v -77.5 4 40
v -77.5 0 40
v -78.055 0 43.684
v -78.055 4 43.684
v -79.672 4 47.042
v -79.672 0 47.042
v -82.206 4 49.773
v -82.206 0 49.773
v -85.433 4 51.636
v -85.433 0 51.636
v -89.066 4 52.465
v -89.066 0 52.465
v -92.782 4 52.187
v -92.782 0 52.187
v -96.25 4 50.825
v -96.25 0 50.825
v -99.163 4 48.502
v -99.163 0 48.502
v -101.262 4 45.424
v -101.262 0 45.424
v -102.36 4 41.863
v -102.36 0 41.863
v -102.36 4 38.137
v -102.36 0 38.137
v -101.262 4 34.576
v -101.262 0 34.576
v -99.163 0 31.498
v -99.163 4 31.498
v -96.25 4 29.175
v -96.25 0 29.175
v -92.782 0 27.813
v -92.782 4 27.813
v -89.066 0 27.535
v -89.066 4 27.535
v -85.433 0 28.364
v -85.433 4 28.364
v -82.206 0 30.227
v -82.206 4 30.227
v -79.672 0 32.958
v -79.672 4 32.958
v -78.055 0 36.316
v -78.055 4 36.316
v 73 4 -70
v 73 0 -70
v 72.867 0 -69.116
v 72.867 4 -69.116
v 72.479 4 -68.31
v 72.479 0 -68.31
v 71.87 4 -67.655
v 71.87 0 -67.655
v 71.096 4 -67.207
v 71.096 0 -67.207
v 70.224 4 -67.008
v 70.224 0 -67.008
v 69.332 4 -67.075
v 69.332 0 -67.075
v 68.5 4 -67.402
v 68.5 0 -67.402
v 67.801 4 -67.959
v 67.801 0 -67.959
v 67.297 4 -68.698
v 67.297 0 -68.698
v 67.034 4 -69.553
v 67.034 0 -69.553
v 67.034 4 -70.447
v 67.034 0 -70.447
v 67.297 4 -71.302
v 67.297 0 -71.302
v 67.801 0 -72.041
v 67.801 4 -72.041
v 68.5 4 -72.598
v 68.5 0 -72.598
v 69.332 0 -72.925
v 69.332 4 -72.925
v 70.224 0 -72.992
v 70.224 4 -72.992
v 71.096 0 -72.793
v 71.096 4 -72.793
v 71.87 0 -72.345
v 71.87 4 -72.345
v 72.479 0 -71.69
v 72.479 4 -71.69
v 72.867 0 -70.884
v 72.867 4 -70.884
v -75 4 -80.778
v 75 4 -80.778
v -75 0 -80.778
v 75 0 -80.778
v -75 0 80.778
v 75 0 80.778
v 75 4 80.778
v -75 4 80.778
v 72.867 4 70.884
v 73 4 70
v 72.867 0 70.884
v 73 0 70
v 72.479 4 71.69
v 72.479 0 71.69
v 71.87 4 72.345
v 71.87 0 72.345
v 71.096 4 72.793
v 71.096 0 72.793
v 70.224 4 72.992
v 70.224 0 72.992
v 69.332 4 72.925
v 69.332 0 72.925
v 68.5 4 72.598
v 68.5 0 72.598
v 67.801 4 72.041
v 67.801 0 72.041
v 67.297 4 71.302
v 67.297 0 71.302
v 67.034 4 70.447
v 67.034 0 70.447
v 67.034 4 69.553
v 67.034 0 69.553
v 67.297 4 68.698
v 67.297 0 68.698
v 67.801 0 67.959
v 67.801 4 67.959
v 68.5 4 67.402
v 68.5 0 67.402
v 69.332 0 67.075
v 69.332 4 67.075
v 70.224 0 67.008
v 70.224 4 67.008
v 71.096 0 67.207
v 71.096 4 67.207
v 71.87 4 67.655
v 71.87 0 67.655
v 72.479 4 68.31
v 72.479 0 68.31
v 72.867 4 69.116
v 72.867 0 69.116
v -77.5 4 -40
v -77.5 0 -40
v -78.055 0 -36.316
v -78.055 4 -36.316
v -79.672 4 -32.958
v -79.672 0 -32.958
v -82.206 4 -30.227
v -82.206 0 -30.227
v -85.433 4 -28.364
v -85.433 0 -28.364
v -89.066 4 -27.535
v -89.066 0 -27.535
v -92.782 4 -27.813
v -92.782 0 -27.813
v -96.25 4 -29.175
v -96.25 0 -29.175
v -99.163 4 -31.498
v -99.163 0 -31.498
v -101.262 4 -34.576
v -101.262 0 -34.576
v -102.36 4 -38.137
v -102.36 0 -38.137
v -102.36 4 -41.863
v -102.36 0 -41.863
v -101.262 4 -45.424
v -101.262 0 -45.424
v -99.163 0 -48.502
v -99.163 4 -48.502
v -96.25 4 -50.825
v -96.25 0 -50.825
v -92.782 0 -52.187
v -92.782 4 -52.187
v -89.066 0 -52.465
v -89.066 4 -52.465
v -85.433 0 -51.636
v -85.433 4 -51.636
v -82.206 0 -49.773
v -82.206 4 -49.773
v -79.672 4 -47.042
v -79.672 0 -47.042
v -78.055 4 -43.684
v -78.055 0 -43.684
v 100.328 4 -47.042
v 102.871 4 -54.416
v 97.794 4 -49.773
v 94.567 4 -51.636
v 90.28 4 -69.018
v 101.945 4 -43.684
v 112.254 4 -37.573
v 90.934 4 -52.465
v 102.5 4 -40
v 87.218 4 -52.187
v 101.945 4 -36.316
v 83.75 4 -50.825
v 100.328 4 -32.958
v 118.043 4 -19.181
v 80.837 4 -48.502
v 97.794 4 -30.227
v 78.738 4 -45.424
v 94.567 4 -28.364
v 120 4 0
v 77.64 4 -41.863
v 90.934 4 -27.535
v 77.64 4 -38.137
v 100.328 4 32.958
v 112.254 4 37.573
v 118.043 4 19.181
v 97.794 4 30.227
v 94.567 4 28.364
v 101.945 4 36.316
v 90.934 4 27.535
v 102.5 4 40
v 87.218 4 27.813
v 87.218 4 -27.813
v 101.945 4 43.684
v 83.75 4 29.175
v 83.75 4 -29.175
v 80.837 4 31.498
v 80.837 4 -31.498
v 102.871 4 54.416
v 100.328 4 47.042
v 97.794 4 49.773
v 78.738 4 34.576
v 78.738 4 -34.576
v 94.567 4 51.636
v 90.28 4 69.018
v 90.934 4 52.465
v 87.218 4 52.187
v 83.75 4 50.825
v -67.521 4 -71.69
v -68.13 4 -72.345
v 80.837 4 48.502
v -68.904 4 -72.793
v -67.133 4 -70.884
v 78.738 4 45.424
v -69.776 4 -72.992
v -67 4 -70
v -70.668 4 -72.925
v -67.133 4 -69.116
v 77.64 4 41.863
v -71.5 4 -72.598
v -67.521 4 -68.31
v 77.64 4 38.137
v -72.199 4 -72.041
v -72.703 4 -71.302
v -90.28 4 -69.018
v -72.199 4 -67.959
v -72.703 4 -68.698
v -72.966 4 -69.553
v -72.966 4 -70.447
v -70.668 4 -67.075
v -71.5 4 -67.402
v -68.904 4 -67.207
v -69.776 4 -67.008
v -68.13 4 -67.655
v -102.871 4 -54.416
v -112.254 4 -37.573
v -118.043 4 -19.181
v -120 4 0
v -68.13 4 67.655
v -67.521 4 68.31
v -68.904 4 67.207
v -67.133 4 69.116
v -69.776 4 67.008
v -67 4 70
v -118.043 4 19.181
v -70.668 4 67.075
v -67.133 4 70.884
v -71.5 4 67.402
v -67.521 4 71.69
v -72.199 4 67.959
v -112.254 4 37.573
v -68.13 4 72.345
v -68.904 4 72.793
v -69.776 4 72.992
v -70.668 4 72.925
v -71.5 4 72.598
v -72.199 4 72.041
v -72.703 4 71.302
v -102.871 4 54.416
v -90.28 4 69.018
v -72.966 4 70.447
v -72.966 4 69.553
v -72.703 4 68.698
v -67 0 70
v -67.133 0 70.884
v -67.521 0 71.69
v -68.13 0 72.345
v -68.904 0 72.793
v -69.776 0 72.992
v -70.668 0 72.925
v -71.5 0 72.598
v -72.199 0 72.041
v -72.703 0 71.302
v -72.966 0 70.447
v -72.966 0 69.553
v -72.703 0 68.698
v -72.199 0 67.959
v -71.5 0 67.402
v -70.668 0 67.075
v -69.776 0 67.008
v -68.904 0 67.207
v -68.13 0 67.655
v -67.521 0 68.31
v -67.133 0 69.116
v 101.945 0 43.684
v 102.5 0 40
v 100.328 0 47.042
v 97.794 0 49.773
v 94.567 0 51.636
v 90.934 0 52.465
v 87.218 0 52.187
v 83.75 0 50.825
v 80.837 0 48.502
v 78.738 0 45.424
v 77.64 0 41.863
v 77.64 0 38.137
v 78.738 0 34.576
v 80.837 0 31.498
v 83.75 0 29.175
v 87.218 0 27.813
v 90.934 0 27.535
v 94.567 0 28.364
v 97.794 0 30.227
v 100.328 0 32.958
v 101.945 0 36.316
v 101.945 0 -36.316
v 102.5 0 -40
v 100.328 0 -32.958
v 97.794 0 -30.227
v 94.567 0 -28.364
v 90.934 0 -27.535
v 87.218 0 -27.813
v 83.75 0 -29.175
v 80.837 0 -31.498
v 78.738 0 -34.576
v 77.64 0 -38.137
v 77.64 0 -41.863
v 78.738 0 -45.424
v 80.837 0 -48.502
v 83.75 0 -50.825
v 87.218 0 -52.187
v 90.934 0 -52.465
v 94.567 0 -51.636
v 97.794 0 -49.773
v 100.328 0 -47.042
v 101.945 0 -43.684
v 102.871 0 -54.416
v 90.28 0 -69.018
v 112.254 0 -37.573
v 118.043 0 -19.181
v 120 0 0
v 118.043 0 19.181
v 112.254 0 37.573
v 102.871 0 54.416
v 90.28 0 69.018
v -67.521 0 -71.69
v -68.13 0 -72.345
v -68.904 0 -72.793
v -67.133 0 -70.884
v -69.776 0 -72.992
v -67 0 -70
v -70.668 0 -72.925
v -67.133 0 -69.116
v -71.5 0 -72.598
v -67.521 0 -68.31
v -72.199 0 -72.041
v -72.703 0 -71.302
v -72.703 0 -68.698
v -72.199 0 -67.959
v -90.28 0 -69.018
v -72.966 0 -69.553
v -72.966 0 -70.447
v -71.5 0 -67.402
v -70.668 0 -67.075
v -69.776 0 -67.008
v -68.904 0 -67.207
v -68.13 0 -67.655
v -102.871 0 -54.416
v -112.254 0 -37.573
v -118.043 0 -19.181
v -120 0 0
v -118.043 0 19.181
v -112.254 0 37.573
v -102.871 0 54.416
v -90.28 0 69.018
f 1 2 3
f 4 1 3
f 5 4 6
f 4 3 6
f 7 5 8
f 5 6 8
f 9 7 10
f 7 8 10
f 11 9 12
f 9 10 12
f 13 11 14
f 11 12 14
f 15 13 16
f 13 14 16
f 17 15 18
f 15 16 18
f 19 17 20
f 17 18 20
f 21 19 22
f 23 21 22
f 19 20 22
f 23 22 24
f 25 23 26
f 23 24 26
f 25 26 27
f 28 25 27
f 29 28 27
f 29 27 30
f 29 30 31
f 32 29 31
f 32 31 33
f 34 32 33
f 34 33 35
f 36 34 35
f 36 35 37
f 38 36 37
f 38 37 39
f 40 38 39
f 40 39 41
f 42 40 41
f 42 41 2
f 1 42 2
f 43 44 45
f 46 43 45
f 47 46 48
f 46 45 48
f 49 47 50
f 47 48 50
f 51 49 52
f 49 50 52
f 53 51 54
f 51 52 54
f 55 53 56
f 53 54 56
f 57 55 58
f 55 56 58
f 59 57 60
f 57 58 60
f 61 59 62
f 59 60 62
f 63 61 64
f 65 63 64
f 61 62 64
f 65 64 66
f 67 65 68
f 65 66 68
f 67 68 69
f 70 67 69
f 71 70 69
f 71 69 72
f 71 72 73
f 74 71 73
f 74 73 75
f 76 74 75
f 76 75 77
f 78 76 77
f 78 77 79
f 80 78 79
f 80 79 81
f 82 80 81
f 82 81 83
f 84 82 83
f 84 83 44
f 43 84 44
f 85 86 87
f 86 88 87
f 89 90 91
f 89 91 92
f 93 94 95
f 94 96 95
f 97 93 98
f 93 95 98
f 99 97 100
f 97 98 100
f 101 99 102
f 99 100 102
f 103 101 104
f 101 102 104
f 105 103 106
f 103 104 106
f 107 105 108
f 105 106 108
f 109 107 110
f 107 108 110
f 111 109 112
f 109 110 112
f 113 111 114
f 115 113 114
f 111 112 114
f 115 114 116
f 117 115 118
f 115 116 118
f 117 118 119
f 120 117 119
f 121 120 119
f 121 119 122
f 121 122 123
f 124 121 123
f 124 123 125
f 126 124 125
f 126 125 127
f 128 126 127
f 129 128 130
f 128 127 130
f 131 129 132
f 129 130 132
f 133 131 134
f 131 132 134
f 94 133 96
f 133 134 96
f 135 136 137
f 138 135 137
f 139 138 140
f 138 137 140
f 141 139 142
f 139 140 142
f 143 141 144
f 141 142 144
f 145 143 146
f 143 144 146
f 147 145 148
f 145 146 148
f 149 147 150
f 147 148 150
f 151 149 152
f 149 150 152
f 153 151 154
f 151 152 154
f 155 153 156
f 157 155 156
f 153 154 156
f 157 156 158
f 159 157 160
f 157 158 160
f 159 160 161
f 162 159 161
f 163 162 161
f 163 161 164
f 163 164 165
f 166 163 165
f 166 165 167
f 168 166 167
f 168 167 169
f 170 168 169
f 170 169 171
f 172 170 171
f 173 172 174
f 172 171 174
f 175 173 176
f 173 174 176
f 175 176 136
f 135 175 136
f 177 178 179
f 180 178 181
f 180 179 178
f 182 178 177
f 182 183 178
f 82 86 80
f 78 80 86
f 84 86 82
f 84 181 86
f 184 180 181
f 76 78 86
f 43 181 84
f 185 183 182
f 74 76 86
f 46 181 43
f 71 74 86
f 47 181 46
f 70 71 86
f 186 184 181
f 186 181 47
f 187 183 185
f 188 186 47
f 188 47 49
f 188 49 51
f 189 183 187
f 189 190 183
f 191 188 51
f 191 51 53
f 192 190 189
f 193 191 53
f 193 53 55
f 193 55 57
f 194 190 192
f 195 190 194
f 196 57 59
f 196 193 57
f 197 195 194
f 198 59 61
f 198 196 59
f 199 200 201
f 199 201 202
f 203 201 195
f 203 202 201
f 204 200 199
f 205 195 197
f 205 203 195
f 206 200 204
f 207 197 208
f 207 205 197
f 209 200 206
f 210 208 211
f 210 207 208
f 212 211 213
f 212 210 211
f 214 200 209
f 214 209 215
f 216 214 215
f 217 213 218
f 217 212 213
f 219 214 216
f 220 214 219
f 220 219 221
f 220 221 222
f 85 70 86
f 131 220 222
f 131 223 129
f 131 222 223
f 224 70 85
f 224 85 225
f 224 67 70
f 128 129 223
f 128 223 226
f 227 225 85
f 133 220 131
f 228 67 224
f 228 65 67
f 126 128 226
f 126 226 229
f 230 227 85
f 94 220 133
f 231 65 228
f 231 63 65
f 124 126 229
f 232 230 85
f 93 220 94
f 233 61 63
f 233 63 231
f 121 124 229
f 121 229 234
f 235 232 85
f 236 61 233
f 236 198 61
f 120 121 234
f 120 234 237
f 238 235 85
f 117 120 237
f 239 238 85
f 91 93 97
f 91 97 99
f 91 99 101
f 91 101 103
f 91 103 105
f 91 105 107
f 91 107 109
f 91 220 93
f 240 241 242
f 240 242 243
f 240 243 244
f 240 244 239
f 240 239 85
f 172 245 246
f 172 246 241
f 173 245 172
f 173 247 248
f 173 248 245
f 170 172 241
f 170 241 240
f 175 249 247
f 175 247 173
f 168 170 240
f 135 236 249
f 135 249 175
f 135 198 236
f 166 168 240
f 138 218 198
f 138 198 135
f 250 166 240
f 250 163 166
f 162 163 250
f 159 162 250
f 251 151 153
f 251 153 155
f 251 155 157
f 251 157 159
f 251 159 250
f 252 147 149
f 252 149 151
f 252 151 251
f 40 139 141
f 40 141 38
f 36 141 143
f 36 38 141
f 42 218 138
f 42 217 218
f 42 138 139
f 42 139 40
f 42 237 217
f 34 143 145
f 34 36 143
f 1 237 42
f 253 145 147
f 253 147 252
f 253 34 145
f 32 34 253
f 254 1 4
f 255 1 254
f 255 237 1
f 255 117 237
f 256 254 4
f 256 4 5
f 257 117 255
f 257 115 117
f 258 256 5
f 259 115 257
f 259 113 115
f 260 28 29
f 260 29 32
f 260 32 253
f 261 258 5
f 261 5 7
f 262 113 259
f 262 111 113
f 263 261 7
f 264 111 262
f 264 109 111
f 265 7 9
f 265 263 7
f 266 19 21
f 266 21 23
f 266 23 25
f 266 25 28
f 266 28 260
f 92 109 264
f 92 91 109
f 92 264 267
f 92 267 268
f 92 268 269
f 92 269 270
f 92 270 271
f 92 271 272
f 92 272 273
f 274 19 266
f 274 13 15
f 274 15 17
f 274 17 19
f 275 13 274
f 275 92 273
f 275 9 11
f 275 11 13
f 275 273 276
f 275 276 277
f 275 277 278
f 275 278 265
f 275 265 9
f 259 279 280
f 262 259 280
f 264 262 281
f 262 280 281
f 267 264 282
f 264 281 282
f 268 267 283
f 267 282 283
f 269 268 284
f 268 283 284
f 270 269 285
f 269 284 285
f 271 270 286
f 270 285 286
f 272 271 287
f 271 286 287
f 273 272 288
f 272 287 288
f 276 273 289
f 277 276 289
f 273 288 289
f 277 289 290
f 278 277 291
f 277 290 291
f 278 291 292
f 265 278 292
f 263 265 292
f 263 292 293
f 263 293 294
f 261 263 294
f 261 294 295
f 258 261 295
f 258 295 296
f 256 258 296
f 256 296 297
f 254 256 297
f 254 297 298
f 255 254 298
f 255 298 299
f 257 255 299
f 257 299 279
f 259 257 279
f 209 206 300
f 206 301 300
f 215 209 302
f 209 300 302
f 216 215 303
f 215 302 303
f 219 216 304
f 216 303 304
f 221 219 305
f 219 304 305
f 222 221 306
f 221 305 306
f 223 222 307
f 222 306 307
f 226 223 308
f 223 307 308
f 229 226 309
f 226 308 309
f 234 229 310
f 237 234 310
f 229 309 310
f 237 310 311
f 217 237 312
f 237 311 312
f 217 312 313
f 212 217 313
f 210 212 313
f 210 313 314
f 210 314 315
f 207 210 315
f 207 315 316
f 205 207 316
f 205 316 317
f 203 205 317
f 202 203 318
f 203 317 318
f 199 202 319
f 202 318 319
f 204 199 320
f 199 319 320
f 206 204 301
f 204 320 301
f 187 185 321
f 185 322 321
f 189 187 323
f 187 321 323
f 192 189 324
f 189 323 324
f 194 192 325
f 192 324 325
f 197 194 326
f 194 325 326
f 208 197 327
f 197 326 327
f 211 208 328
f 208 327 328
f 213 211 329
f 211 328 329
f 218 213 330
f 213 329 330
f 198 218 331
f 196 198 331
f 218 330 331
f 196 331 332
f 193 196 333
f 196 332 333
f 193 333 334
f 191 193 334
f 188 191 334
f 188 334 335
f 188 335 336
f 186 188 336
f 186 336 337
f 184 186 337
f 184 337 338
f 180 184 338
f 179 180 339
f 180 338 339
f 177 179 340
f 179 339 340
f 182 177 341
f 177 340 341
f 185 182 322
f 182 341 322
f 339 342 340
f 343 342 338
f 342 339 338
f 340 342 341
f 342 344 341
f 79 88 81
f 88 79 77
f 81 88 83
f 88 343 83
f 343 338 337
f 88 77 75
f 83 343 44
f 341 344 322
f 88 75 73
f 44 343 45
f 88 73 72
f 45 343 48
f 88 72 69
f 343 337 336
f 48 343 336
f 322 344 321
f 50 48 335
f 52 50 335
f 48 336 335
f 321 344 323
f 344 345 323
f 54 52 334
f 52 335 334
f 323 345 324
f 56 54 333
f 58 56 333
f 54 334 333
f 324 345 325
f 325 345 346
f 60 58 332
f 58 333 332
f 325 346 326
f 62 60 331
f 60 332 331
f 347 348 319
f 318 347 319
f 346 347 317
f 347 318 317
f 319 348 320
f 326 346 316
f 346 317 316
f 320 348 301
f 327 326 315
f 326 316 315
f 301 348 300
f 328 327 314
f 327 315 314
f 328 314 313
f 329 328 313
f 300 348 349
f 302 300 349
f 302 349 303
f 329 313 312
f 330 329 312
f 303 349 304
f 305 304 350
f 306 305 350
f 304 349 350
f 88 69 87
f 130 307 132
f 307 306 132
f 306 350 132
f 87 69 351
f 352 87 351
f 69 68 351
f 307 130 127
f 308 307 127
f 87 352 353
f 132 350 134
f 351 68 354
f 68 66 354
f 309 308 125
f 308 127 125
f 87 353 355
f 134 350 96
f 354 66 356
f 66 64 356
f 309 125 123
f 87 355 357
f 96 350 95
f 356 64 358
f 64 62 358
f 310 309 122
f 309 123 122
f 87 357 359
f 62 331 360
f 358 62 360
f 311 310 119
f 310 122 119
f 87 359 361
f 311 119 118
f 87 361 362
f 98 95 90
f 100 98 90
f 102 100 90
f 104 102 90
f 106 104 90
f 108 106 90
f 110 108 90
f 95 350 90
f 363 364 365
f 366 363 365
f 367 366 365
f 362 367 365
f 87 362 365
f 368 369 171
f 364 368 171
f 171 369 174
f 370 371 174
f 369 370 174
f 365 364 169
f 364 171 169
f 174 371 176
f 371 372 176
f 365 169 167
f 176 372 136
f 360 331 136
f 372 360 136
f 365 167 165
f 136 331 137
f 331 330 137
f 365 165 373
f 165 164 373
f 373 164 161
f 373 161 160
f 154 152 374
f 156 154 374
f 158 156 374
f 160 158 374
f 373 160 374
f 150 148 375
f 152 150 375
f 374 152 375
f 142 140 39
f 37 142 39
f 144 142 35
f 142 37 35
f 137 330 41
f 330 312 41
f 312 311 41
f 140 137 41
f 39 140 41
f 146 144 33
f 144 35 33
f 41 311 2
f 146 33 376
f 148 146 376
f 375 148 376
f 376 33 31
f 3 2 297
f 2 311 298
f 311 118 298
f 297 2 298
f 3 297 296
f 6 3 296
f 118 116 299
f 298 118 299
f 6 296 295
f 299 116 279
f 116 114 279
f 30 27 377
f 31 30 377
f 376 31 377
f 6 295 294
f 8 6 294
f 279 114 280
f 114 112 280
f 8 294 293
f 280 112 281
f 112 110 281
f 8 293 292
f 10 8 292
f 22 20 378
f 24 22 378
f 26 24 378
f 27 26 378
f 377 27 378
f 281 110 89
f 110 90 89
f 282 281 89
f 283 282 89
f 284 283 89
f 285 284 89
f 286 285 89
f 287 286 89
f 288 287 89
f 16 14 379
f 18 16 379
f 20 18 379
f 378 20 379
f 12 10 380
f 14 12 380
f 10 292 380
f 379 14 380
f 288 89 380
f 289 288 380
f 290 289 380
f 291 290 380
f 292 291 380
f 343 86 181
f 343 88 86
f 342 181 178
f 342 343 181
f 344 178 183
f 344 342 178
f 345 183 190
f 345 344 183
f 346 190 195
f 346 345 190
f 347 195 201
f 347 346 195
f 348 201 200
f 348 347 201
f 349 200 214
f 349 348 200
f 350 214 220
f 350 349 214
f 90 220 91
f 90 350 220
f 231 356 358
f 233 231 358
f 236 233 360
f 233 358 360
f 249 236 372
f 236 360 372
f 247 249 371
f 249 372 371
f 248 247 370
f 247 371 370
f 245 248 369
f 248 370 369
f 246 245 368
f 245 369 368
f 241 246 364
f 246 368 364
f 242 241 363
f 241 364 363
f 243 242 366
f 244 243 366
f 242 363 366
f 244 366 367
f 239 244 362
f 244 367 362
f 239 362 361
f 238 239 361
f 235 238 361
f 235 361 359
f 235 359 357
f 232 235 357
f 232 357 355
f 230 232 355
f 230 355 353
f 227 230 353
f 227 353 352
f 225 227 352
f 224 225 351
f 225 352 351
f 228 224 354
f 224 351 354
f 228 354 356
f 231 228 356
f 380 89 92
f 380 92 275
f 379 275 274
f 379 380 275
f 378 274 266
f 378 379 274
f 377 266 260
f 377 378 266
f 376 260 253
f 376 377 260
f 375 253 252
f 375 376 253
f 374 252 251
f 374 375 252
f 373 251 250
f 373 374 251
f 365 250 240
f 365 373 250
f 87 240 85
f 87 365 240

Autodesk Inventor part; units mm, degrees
ref_plane "YZ Plane" through (0, 0, 0) normal (1, 0, 0) x (0, 1, 0)
ref_plane "XZ Plane" through (0, 0, 0) normal (0, 1, 0) x (-1, 0, 0)
ref_plane "XY Plane" through (0, 0, 0) normal (0, 0, 1) x (1, 0, 0)
sketch "Esquisse1" plane through (0, 0, 0) normal (0, 1, 0) x (-1, 0, 0)
  circle A0 centre (0, 0) radius 25 construction
  line L0 (-25, 0) -> (25, 0) construction
  arc A1 (-75, -80.7775) -> (-75, 80.7775) centre (-25, 0) ccw construction
  arc A2 (75, 80.7775) -> (75, -80.7775) centre (25, 0) ccw construction
  line L1 (0, 25) -> (0, 0) construction
  line L2 (-75, 80.7775) -> (75, 80.7775)
  line L3 (-75, -80.7775) -> (75, -80.7775)
  arc A3 (75, -80.7775) -> (75, 80.7775) centre (25, 0) ccw
  arc A4 (-75, 80.7775) -> (-75, -80.7775) centre (-25, 0) ccw
  dimension "d0" = 50
  dimension "d1" = 190
  dimension "d2" = 150
extrude "Extrusion1" add sketch "Esquisse1" along normal blind 4
sketch "Esquisse16" plane through (0, 0, 0) normal (0, -1, 0) x (1, 0, 0)
  line L0 (-70, 70) -> (70, 70) construction
  line L1 (70, 70) -> (70, -70) construction
  line L2 (70, -70) -> (-70, -70) construction
  line L3 (-70, -70) -> (-70, 70) construction
  circle A0 centre (70, 70) radius 3
  circle A1 centre (-70, 70) radius 3
  circle A2 centre (-70, -70) radius 3
  circle A3 centre (70, -70) radius 3
  point P0 (0, 0)
  dimension "d146" = 140
  dimension "d147" = 140
  dimension "d148" = 6
  dimension "d149" = 6
  dimension "d150" = 6
  dimension "d151" = 6
  dimension "d152" = 70
  dimension "d153" = 70
extrude "Extrusion13" cut sketch "Esquisse16" against normal through all
sketch "Esquisse18" plane through (0, 0, 0) normal (0, -1, 0) x (1, 0, 0)
  line L0 (-90, 40) -> (90, 40) construction
  line L1 (90, 40) -> (90, -40) construction
  line L2 (90, -40) -> (-90, -40) construction
  line L3 (-90, -40) -> (-90, 40) construction
  circle A0 centre (-90, 40) radius 12.5
  circle A1 centre (90, 40) radius 12.5
  circle A2 centre (90, -40) radius 12.5
  circle A3 centre (-90, -40) radius 12.5
  point P0 (0, 0)
  dimension "d170" = 180
  dimension "d171" = 90
  dimension "d172" = 80
  dimension "d173" = 40
  dimension "d174" = 25
  dimension "d175" = 25
  dimension "d176" = 25
  dimension "d177" = 25
extrude "Extrusion15" cut sketch "Esquisse18" against normal through all
properties part number "base"
